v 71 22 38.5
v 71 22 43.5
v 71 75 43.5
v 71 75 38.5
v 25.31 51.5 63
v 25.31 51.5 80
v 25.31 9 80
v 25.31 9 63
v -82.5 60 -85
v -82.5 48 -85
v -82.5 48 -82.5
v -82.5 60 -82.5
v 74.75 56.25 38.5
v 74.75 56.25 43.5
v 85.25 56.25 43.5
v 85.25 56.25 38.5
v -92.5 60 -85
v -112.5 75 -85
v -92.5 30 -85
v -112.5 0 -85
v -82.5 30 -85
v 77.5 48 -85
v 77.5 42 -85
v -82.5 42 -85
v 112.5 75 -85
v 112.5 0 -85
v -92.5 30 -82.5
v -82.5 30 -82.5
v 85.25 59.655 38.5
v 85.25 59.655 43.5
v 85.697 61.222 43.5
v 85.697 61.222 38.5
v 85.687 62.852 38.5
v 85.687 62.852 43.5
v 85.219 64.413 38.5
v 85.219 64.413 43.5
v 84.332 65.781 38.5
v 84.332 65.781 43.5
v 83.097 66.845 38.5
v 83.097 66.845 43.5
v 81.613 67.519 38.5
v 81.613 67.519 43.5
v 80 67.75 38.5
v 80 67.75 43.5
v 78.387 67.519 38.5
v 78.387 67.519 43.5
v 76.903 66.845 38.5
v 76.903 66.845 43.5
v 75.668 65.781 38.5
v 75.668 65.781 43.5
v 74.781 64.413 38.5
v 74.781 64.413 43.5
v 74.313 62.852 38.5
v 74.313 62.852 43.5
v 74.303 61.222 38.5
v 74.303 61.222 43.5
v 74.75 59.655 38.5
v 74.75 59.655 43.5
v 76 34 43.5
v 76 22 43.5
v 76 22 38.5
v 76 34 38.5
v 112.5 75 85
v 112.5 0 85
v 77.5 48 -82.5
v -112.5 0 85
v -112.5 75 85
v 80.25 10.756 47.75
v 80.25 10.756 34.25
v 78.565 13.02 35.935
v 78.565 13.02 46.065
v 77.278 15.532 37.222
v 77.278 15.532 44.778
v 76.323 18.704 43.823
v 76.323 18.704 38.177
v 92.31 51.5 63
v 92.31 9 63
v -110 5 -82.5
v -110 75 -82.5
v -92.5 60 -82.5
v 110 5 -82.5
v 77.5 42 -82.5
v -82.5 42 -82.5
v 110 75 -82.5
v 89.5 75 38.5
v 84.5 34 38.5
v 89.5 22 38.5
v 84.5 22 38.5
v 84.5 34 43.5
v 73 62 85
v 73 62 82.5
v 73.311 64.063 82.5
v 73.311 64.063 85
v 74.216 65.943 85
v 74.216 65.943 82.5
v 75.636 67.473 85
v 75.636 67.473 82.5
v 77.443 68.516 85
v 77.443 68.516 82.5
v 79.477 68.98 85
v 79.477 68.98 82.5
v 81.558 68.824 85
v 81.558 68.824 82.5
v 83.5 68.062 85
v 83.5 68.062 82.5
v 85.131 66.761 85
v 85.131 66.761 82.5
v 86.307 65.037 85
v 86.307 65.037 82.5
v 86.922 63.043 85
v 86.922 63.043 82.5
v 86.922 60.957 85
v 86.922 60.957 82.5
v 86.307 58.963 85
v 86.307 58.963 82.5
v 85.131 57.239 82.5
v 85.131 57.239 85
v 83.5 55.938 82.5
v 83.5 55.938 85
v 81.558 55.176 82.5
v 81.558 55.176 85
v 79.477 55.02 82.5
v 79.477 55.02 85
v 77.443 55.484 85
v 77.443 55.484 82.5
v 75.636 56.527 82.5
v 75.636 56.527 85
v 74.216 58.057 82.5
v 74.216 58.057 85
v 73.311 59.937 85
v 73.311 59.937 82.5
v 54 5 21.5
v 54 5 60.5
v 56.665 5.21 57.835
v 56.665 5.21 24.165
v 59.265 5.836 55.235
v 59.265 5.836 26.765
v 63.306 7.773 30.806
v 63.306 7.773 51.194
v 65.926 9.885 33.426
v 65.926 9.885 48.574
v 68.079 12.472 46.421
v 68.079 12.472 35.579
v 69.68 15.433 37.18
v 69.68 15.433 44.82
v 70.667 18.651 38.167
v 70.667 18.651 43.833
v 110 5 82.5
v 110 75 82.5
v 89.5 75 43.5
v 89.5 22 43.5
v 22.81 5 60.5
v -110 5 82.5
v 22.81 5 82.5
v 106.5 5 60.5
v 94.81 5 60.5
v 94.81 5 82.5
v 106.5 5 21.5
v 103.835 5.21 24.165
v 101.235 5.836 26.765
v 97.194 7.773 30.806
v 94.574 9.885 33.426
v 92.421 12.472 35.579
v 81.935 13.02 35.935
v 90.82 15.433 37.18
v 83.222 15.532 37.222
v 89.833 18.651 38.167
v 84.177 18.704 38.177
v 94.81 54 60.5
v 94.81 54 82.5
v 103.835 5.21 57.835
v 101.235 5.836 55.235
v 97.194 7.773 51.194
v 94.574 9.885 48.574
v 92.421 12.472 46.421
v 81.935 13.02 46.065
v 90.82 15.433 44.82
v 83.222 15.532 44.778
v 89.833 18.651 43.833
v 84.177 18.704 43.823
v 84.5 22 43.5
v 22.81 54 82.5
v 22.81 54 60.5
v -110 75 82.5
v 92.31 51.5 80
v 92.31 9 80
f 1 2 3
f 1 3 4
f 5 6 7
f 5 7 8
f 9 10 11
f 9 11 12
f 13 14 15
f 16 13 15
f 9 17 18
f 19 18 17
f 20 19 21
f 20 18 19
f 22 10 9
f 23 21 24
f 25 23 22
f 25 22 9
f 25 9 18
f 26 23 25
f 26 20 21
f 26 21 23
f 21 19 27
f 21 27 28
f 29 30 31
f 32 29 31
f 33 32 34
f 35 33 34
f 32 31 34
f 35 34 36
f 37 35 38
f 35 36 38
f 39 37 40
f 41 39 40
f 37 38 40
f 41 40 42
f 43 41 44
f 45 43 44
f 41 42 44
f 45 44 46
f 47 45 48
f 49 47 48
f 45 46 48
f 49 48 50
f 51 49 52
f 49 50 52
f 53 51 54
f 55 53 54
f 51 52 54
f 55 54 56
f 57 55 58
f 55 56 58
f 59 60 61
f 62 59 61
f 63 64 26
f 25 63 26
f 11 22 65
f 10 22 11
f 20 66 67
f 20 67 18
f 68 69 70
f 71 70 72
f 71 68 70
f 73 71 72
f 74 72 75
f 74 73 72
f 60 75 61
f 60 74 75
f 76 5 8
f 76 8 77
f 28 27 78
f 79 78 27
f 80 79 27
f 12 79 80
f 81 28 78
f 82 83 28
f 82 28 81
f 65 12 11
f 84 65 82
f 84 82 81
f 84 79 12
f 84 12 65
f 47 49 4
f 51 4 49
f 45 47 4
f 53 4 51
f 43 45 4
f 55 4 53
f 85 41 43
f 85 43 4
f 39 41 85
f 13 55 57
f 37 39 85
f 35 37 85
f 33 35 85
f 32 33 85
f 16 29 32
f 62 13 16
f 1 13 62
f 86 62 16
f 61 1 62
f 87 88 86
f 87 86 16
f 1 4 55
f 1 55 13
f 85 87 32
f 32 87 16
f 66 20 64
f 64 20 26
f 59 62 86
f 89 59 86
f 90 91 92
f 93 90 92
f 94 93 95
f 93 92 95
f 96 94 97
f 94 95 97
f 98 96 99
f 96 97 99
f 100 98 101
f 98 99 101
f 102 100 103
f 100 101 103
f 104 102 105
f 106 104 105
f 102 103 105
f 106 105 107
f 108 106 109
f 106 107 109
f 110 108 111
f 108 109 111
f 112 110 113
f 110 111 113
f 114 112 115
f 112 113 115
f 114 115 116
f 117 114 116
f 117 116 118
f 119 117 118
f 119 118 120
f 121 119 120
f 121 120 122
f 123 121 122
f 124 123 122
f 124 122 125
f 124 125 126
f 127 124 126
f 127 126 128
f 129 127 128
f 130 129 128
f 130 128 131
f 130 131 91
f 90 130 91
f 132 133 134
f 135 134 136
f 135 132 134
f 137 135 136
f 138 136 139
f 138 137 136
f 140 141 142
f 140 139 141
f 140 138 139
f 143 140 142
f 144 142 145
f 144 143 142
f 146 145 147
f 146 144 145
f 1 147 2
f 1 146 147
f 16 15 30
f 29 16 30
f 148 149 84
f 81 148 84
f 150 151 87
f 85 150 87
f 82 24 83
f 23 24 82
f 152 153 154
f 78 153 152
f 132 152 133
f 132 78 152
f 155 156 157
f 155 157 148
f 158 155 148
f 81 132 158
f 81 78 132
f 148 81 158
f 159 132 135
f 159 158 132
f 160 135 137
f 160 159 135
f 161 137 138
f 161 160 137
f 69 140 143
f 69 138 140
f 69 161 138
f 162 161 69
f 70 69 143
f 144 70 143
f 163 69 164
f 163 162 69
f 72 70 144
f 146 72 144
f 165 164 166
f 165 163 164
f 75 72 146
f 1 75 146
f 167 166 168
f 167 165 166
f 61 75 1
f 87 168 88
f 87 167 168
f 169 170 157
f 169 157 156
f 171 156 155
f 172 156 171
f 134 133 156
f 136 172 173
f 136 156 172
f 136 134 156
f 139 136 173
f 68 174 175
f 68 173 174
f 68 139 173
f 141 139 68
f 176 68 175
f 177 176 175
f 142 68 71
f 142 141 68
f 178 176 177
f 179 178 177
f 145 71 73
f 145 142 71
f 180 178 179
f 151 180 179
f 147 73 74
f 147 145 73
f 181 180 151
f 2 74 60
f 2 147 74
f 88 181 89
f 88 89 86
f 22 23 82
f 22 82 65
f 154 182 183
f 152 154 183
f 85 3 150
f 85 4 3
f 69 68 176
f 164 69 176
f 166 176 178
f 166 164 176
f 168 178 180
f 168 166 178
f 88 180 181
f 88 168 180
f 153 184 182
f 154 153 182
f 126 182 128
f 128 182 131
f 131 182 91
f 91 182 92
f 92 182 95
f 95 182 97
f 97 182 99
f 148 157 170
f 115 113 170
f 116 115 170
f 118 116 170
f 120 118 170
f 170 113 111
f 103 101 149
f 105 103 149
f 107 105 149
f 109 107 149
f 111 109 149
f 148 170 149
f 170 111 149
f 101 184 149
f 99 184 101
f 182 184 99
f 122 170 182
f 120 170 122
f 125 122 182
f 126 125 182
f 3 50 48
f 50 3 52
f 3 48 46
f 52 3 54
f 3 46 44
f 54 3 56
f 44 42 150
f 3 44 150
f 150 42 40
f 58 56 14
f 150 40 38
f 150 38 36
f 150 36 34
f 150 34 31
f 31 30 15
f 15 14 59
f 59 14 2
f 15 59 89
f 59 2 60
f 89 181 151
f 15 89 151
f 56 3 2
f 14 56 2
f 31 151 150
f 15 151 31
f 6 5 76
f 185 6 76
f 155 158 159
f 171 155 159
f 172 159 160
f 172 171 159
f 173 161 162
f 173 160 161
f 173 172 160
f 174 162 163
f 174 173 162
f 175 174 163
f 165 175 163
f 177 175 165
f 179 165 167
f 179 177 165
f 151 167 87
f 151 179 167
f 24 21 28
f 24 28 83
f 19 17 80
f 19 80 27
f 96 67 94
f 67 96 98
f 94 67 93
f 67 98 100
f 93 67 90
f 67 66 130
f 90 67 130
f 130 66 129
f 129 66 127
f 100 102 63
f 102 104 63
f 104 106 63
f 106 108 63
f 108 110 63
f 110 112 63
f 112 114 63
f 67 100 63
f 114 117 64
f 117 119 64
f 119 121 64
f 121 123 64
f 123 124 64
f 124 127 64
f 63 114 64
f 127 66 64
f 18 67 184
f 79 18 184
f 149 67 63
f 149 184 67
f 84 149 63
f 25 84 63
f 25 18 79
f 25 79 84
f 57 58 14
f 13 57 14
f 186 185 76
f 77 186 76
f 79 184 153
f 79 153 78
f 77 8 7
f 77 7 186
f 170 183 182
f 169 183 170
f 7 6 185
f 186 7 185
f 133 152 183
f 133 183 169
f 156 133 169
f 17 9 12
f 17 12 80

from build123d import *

# Parameters (mm, degrees)
SKETCH1_W                = 225
SKETCH1_H                = 170
BOSS_EXTRUDE1_DEPTH      = 75
SKETCH2_W                = 220
SKETCH2_H                = 165
CUT_EXTRUDE1_DEPTH       = 70
CUT_EXTRUDE2_DEPTH       = 10
SKETCH6_W                = 72
SKETCH6_H                = 22
BOSS_EXTRUDE2_DEPTH      = 49
SKETCH8_R                = 7
CUT_EXTRUDE3_DEPTH       = 25
SKETCH6_4_W              = 5
SKETCH6_4_H              = 5
BOSS_EXTRUDE4_DEPTH      = 70
BOSS_EXTRUDE5_DEPTH      = 40
BOSS_EXTRUDE5_DEPTH_BACK = 1
BOSS_EXTRUDE5_START      = 30
SKETCH11_W               = 8.5
SKETCH11_H               = 5
CUT_EXTRUDE4_DEPTH       = 10
CUT_EXTRUDE5_START       = -2.5
SKETCH13_W               = 67
SKETCH13_H               = 17
CUT_EXTRUDE5_DEPTH       = 42.5
FILLET1_R                = 17


with BuildPart() as part:
    # Sketch1 → Boss-Extrude1 (new body)
    with BuildSketch(Plane(origin=(0, 0, 0), x_dir=(1, 0, 0), z_dir=(0, 1, 0))):
        Rectangle(SKETCH1_W, SKETCH1_H)
    extrude(amount=BOSS_EXTRUDE1_DEPTH)

    # Sketch2 → Cut-Extrude1 (cut)
    with BuildSketch(Plane(origin=(0, 75, 0), x_dir=(1, 0, 0), z_dir=(0, 1, 0))):
        Rectangle(SKETCH2_W, SKETCH2_H)
    extrude(amount=-CUT_EXTRUDE1_DEPTH, mode=Mode.SUBTRACT)

    # Sketch5 → Cut-Extrude2 (cut)
    with BuildSketch(Plane(origin=(0, 0, -85), x_dir=(-1, 0, 0), z_dir=(0, 0, -1))):
        Polygon((92.5, 60), (92.5, 30), (82.5, 30), (82.5, 42), (-77.5, 42), (-77.5, 48), (82.5, 48), (82.5, 60), align=None)
    extrude(amount=-CUT_EXTRUDE2_DEPTH, mode=Mode.SUBTRACT)

    # Sketch6 → Boss-Extrude2 (add)
    with BuildSketch(Plane(origin=(0, 5, 0), x_dir=(1, 0, 0), z_dir=(0, 1, 0))):
        with Locations((58.810452566, -71.5)):
            Rectangle(SKETCH6_W, SKETCH6_H)
    extrude(amount=BOSS_EXTRUDE2_DEPTH)

    # Sketch8 → Cut-Extrude3 (cut)
    with BuildSketch(Plane(origin=(0, 0, 82.5), x_dir=(-1, 0, 0), z_dir=(0, 0, -1))):
        with Locations((-80, 62)):
            Circle(SKETCH8_R)
    extrude(amount=-CUT_EXTRUDE3_DEPTH, mode=Mode.SUBTRACT)

    # Sketch6<4> → Boss-Extrude4 (add)
    with BuildSketch(Plane(origin=(0, 5, 0), x_dir=(1, 0, 0), z_dir=(0, 1, 0))):
        with Locations((73.5, -41)):
            Rectangle(SKETCH6_4_W, SKETCH6_4_H)
        with Locations((87, -41)):
            Rectangle(SKETCH6_4_W, SKETCH6_4_H)
    extrude(amount=BOSS_EXTRUDE4_DEPTH)

    # Sketch11 → Boss-Extrude5 (add, two sides: drawn at the far end of the back side and taken through both)
    with BuildSketch(Plane(origin=(0, 5, 0), x_dir=(1, 0, 0), z_dir=(0, 1, 0)).offset(BOSS_EXTRUDE5_START - BOSS_EXTRUDE5_DEPTH_BACK)):
        with Locations((80.25, -41)):
            Rectangle(SKETCH11_W, SKETCH11_H)
    extrude(amount=BOSS_EXTRUDE5_DEPTH + BOSS_EXTRUDE5_DEPTH_BACK)

    # Sketch12 → Cut-Extrude4 (cut)
    with BuildSketch(Plane.XY.offset(43.5)):
        with BuildLine():
            Line((74.75, 59.65479212), (74.75, 56.25))
            Line((74.75, 56.25), (85.25, 56.25))
            Line((85.25, 56.25), (85.25, 59.65479212))
            ThreePointArc((85.25, 59.65479212), (80, 67.75), (74.75, 59.65479212))
        make_face()
    extrude(amount=-CUT_EXTRUDE4_DEPTH, mode=Mode.SUBTRACT)

    # Sketch13 → Cut-Extrude5 (cut)
    with BuildSketch(Plane(origin=(0, 54, 0), x_dir=(1, 0, 0), z_dir=(0, 1, 0)).offset(CUT_EXTRUDE5_START)):
        with Locations((58.810452566, -71.5)):
            Rectangle(SKETCH13_W, SKETCH13_H)
    extrude(amount=-CUT_EXTRUDE5_DEPTH, mode=Mode.SUBTRACT)

    # Fillet1
    # the kernel refuses this fillet: 17 mm, written as the material it adds along each edge
    with BuildSketch(Plane(origin=(84.5, 5, 38.5), x_dir=(-1, 0, 0), z_dir=(0, 0, 1)), Plane(origin=(89.5, 5, 38.5), x_dir=(0, 0, -1), z_dir=(-1, 0, 0)), Plane(origin=(71, 5, 43.5), x_dir=(0, 0, 1), z_dir=(1, 0, 0)), Plane(origin=(76, 5, 43.5), x_dir=(1, 0, 0), z_dir=(0, 0, -1)), Plane(origin=(71, 5, 38.5), x_dir=(-1, 0, 0), z_dir=(0, 0, 1)), Plane(origin=(76, 5, 38.5), x_dir=(0, 0, -1), z_dir=(-1, 0, 0)), Plane(origin=(84.5, 5, 43.5), x_dir=(0, 0, 1), z_dir=(1, 0, 0)), Plane(origin=(89.5, 5, 43.5), x_dir=(1, 0, 0), z_dir=(0, 0, -1))) as fillet1_piece_1:
        with BuildLine():
            CenterArc((FILLET1_R, -FILLET1_R), FILLET1_R, 90, 90)
            Line((0, -FILLET1_R), (-FILLET1_R * 0.02, -FILLET1_R))
            Line((-FILLET1_R * 0.02, -FILLET1_R), (-FILLET1_R * 0.02, FILLET1_R * 0.02))
            Line((-FILLET1_R * 0.02, FILLET1_R * 0.02), (FILLET1_R, FILLET1_R * 0.02))
            Line((FILLET1_R, FILLET1_R * 0.02), (FILLET1_R, 0))
        make_face()
    extrude(amount=5)
    with BuildSketch(Plane(origin=(84.5, 5, -4), x_dir=(-1, 0, 0), z_dir=(0, 0, 1))) as fillet1_piece_2a_section:
        with BuildLine():
            CenterArc((FILLET1_R, -FILLET1_R), FILLET1_R, 90, 90)
            Line((0, -FILLET1_R), (-FILLET1_R * 0.02, -FILLET1_R))
            Line((-FILLET1_R * 0.02, -FILLET1_R), (-FILLET1_R * 0.02, FILLET1_R * 0.02))
            Line((-FILLET1_R * 0.02, FILLET1_R * 0.02), (FILLET1_R, FILLET1_R * 0.02))
            Line((FILLET1_R, FILLET1_R * 0.02), (FILLET1_R, 0))
        make_face()
    fillet1_piece_2a = extrude(amount=47.5, mode=Mode.PRIVATE)
    fillet1_piece_2a = split(fillet1_piece_2a, bisect_by=Plane(origin=(80.651283057, 8.848716943, 38.5), z_dir=(0, 0, -1)), keep=Keep.TOP, mode=Mode.PRIVATE)
    with BuildSketch(Plane(origin=(89.5, 5, 38.5), x_dir=(0, 0, -1), z_dir=(-1, 0, 0))) as fillet1_piece_2b_section:
        with BuildLine():
            CenterArc((FILLET1_R, -FILLET1_R), FILLET1_R, 90, 90)
            Line((0, -FILLET1_R), (-FILLET1_R * 0.02, -FILLET1_R))
            Line((-FILLET1_R * 0.02, -FILLET1_R), (-FILLET1_R * 0.02, FILLET1_R * 0.02))
            Line((-FILLET1_R * 0.02, FILLET1_R * 0.02), (FILLET1_R, FILLET1_R * 0.02))
            Line((FILLET1_R, FILLET1_R * 0.02), (FILLET1_R, 0))
        make_face()
    fillet1_piece_2b = extrude(amount=47.5, mode=Mode.PRIVATE)
    fillet1_piece_2b = split(fillet1_piece_2b, bisect_by=Plane(origin=(84.5, 8.848716943, 34.651283057), z_dir=(-1, 0, 0)), keep=Keep.TOP, mode=Mode.PRIVATE)
    fillet1_piece_2 = fillet1_piece_2a & fillet1_piece_2b
    add(fillet1_piece_2)
    with BuildSketch(Plane(origin=(84.5, 5, 38.5), x_dir=(-1, 0, 0), z_dir=(0, 0, 1))) as fillet1_piece_3a_section:
        with BuildLine():
            CenterArc((FILLET1_R, -FILLET1_R), FILLET1_R, 90, 90)
            Line((0, -FILLET1_R), (-FILLET1_R * 0.02, -FILLET1_R))
            Line((-FILLET1_R * 0.02, -FILLET1_R), (-FILLET1_R * 0.02, FILLET1_R * 0.02))
            Line((-FILLET1_R * 0.02, FILLET1_R * 0.02), (FILLET1_R, FILLET1_R * 0.02))
            Line((FILLET1_R, FILLET1_R * 0.02), (FILLET1_R, 0))
        make_face()
    fillet1_piece_3a = extrude(amount=47.5, mode=Mode.PRIVATE)
    fillet1_piece_3a = split(fillet1_piece_3a, bisect_by=Plane(origin=(80.651283057, 8.848716943, 43.5), z_dir=(0, 0, 1)), keep=Keep.TOP, mode=Mode.PRIVATE)
    with BuildSketch(Plane(origin=(42, 5, 43.5), x_dir=(0, 0, 1), z_dir=(1, 0, 0))) as fillet1_piece_3b_section:
        with BuildLine():
            CenterArc((FILLET1_R, -FILLET1_R), FILLET1_R, 90, 90)
            Line((0, -FILLET1_R), (-FILLET1_R * 0.02, -FILLET1_R))
            Line((-FILLET1_R * 0.02, -FILLET1_R), (-FILLET1_R * 0.02, FILLET1_R * 0.02))
            Line((-FILLET1_R * 0.02, FILLET1_R * 0.02), (FILLET1_R, FILLET1_R * 0.02))
            Line((FILLET1_R, FILLET1_R * 0.02), (FILLET1_R, 0))
        make_face()
    fillet1_piece_3b = extrude(amount=47.5, mode=Mode.PRIVATE)
    fillet1_piece_3b = split(fillet1_piece_3b, bisect_by=Plane(origin=(84.5, 8.848716943, 47.348716943), z_dir=(-1, 0, 0)), keep=Keep.TOP, mode=Mode.PRIVATE)
    fillet1_piece_3 = fillet1_piece_3a & fillet1_piece_3b
    add(fillet1_piece_3)
    with BuildSketch(Plane(origin=(132, 5, 38.5), x_dir=(0, 0, -1), z_dir=(-1, 0, 0))) as fillet1_piece_4a_section:
        with BuildLine():
            CenterArc((FILLET1_R, -FILLET1_R), FILLET1_R, 90, 90)
            Line((0, -FILLET1_R), (-FILLET1_R * 0.02, -FILLET1_R))
            Line((-FILLET1_R * 0.02, -FILLET1_R), (-FILLET1_R * 0.02, FILLET1_R * 0.02))
            Line((-FILLET1_R * 0.02, FILLET1_R * 0.02), (FILLET1_R, FILLET1_R * 0.02))
            Line((FILLET1_R, FILLET1_R * 0.02), (FILLET1_R, 0))
        make_face()
    fillet1_piece_4a = extrude(amount=47.5, mode=Mode.PRIVATE)
    fillet1_piece_4a = split(fillet1_piece_4a, bisect_by=Plane(origin=(89.5, 8.848716943, 34.651283057), z_dir=(1, 0, 0)), keep=Keep.TOP, mode=Mode.PRIVATE)
    with BuildSketch(Plane(origin=(89.5, 5, 43.5), x_dir=(1, 0, 0), z_dir=(0, 0, -1))) as fillet1_piece_4b_section:
        with BuildLine():
            CenterArc((FILLET1_R, -FILLET1_R), FILLET1_R, 90, 90)
            Line((0, -FILLET1_R), (-FILLET1_R * 0.02, -FILLET1_R))
            Line((-FILLET1_R * 0.02, -FILLET1_R), (-FILLET1_R * 0.02, FILLET1_R * 0.02))
            Line((-FILLET1_R * 0.02, FILLET1_R * 0.02), (FILLET1_R, FILLET1_R * 0.02))
            Line((FILLET1_R, FILLET1_R * 0.02), (FILLET1_R, 0))
        make_face()
    fillet1_piece_4b = extrude(amount=47.5, mode=Mode.PRIVATE)
    fillet1_piece_4b = split(fillet1_piece_4b, bisect_by=Plane(origin=(93.348716943, 8.848716943, 38.5), z_dir=(0, 0, -1)), keep=Keep.TOP, mode=Mode.PRIVATE)
    fillet1_piece_4 = fillet1_piece_4a & fillet1_piece_4b
    add(fillet1_piece_4)
    with BuildSketch(Plane(origin=(71, 5, 38.5), x_dir=(-1, 0, 0), z_dir=(0, 0, 1))) as fillet1_piece_5a_section:
        with BuildLine():
            CenterArc((FILLET1_R, -FILLET1_R), FILLET1_R, 90, 90)
            Line((0, -FILLET1_R), (-FILLET1_R * 0.02, -FILLET1_R))
            Line((-FILLET1_R * 0.02, -FILLET1_R), (-FILLET1_R * 0.02, FILLET1_R * 0.02))
            Line((-FILLET1_R * 0.02, FILLET1_R * 0.02), (FILLET1_R, FILLET1_R * 0.02))
            Line((FILLET1_R, FILLET1_R * 0.02), (FILLET1_R, 0))
        make_face()
    fillet1_piece_5a = extrude(amount=47.5, mode=Mode.PRIVATE)
    fillet1_piece_5a = split(fillet1_piece_5a, bisect_by=Plane(origin=(67.151283057, 8.848716943, 43.5), z_dir=(0, 0, 1)), keep=Keep.TOP, mode=Mode.PRIVATE)
    with BuildSketch(Plane(origin=(28.5, 5, 43.5), x_dir=(0, 0, 1), z_dir=(1, 0, 0))) as fillet1_piece_5b_section:
        with BuildLine():
            CenterArc((FILLET1_R, -FILLET1_R), FILLET1_R, 90, 90)
            Line((0, -FILLET1_R), (-FILLET1_R * 0.02, -FILLET1_R))
            Line((-FILLET1_R * 0.02, -FILLET1_R), (-FILLET1_R * 0.02, FILLET1_R * 0.02))
            Line((-FILLET1_R * 0.02, FILLET1_R * 0.02), (FILLET1_R, FILLET1_R * 0.02))
            Line((FILLET1_R, FILLET1_R * 0.02), (FILLET1_R, 0))
        make_face()
    fillet1_piece_5b = extrude(amount=47.5, mode=Mode.PRIVATE)
    fillet1_piece_5b = split(fillet1_piece_5b, bisect_by=Plane(origin=(71, 8.848716943, 47.348716943), z_dir=(-1, 0, 0)), keep=Keep.TOP, mode=Mode.PRIVATE)
    fillet1_piece_5 = fillet1_piece_5a & fillet1_piece_5b
    add(fillet1_piece_5)
    with BuildSketch(Plane(origin=(76, 5, 86), x_dir=(1, 0, 0), z_dir=(0, 0, -1))) as fillet1_piece_6a_section:
        with BuildLine():
            CenterArc((FILLET1_R, -FILLET1_R), FILLET1_R, 90, 90)
            Line((0, -FILLET1_R), (-FILLET1_R * 0.02, -FILLET1_R))
            Line((-FILLET1_R * 0.02, -FILLET1_R), (-FILLET1_R * 0.02, FILLET1_R * 0.02))
            Line((-FILLET1_R * 0.02, FILLET1_R * 0.02), (FILLET1_R, FILLET1_R * 0.02))
            Line((FILLET1_R, FILLET1_R * 0.02), (FILLET1_R, 0))
        make_face()
    fillet1_piece_6a = extrude(amount=47.5, mode=Mode.PRIVATE)
    fillet1_piece_6a = split(fillet1_piece_6a, bisect_by=Plane(origin=(79.848716943, 8.848716943, 43.5), z_dir=(0, 0, 1)), keep=Keep.TOP, mode=Mode.PRIVATE)
    with BuildSketch(Plane(origin=(71, 5, 43.5), x_dir=(0, 0, 1), z_dir=(1, 0, 0))) as fillet1_piece_6b_section:
        with BuildLine():
            CenterArc((FILLET1_R, -FILLET1_R), FILLET1_R, 90, 90)
            Line((0, -FILLET1_R), (-FILLET1_R * 0.02, -FILLET1_R))
            Line((-FILLET1_R * 0.02, -FILLET1_R), (-FILLET1_R * 0.02, FILLET1_R * 0.02))
            Line((-FILLET1_R * 0.02, FILLET1_R * 0.02), (FILLET1_R, FILLET1_R * 0.02))
            Line((FILLET1_R, FILLET1_R * 0.02), (FILLET1_R, 0))
        make_face()
    fillet1_piece_6b = extrude(amount=47.5, mode=Mode.PRIVATE)
    fillet1_piece_6b = split(fillet1_piece_6b, bisect_by=Plane(origin=(76, 8.848716943, 47.348716943), z_dir=(1, 0, 0)), keep=Keep.TOP, mode=Mode.PRIVATE)
    fillet1_piece_6 = fillet1_piece_6a & fillet1_piece_6b
    add(fillet1_piece_6)
    with BuildSketch(Plane(origin=(118.5, 5, 38.5), x_dir=(0, 0, -1), z_dir=(-1, 0, 0))) as fillet1_piece_7a_section:
        with BuildLine():
            CenterArc((FILLET1_R, -FILLET1_R), FILLET1_R, 90, 90)
            Line((0, -FILLET1_R), (-FILLET1_R * 0.02, -FILLET1_R))
            Line((-FILLET1_R * 0.02, -FILLET1_R), (-FILLET1_R * 0.02, FILLET1_R * 0.02))
            Line((-FILLET1_R * 0.02, FILLET1_R * 0.02), (FILLET1_R, FILLET1_R * 0.02))
            Line((FILLET1_R, FILLET1_R * 0.02), (FILLET1_R, 0))
        make_face()
    fillet1_piece_7a = extrude(amount=47.5, mode=Mode.PRIVATE)
    fillet1_piece_7a = split(fillet1_piece_7a, bisect_by=Plane(origin=(76, 8.848716943, 34.651283057), z_dir=(1, 0, 0)), keep=Keep.TOP, mode=Mode.PRIVATE)
    with BuildSketch(Plane(origin=(76, 5, 43.5), x_dir=(1, 0, 0), z_dir=(0, 0, -1))) as fillet1_piece_7b_section:
        with BuildLine():
            CenterArc((FILLET1_R, -FILLET1_R), FILLET1_R, 90, 90)
            Line((0, -FILLET1_R), (-FILLET1_R * 0.02, -FILLET1_R))
            Line((-FILLET1_R * 0.02, -FILLET1_R), (-FILLET1_R * 0.02, FILLET1_R * 0.02))
            Line((-FILLET1_R * 0.02, FILLET1_R * 0.02), (FILLET1_R, FILLET1_R * 0.02))
            Line((FILLET1_R, FILLET1_R * 0.02), (FILLET1_R, 0))
        make_face()
    fillet1_piece_7b = extrude(amount=47.5, mode=Mode.PRIVATE)
    fillet1_piece_7b = split(fillet1_piece_7b, bisect_by=Plane(origin=(79.848716943, 8.848716943, 38.5), z_dir=(0, 0, -1)), keep=Keep.TOP, mode=Mode.PRIVATE)
    fillet1_piece_7 = fillet1_piece_7a & fillet1_piece_7b
    add(fillet1_piece_7)
    with BuildSketch(Plane(origin=(71, 5, -4), x_dir=(-1, 0, 0), z_dir=(0, 0, 1))) as fillet1_piece_8a_section:
        with BuildLine():
            CenterArc((FILLET1_R, -FILLET1_R), FILLET1_R, 90, 90)
            Line((0, -FILLET1_R), (-FILLET1_R * 0.02, -FILLET1_R))
            Line((-FILLET1_R * 0.02, -FILLET1_R), (-FILLET1_R * 0.02, FILLET1_R * 0.02))
            Line((-FILLET1_R * 0.02, FILLET1_R * 0.02), (FILLET1_R, FILLET1_R * 0.02))
            Line((FILLET1_R, FILLET1_R * 0.02), (FILLET1_R, 0))
        make_face()
    fillet1_piece_8a = extrude(amount=47.5, mode=Mode.PRIVATE)
    fillet1_piece_8a = split(fillet1_piece_8a, bisect_by=Plane(origin=(67.151283057, 8.848716943, 38.5), z_dir=(0, 0, -1)), keep=Keep.TOP, mode=Mode.PRIVATE)
    with BuildSketch(Plane(origin=(76, 5, 38.5), x_dir=(0, 0, -1), z_dir=(-1, 0, 0))) as fillet1_piece_8b_section:
        with BuildLine():
            CenterArc((FILLET1_R, -FILLET1_R), FILLET1_R, 90, 90)
            Line((0, -FILLET1_R), (-FILLET1_R * 0.02, -FILLET1_R))
            Line((-FILLET1_R * 0.02, -FILLET1_R), (-FILLET1_R * 0.02, FILLET1_R * 0.02))
            Line((-FILLET1_R * 0.02, FILLET1_R * 0.02), (FILLET1_R, FILLET1_R * 0.02))
            Line((FILLET1_R, FILLET1_R * 0.02), (FILLET1_R, 0))
        make_face()
    fillet1_piece_8b = extrude(amount=47.5, mode=Mode.PRIVATE)
    fillet1_piece_8b = split(fillet1_piece_8b, bisect_by=Plane(origin=(71, 8.848716943, 34.651283057), z_dir=(-1, 0, 0)), keep=Keep.TOP, mode=Mode.PRIVATE)
    fillet1_piece_8 = fillet1_piece_8a & fillet1_piece_8b
    add(fillet1_piece_8)
    with BuildSketch(Plane(origin=(89.5, 5, 86), x_dir=(1, 0, 0), z_dir=(0, 0, -1))) as fillet1_piece_9a_section:
        with BuildLine():
            CenterArc((FILLET1_R, -FILLET1_R), FILLET1_R, 90, 90)
            Line((0, -FILLET1_R), (-FILLET1_R * 0.02, -FILLET1_R))
            Line((-FILLET1_R * 0.02, -FILLET1_R), (-FILLET1_R * 0.02, FILLET1_R * 0.02))
            Line((-FILLET1_R * 0.02, FILLET1_R * 0.02), (FILLET1_R, FILLET1_R * 0.02))
            Line((FILLET1_R, FILLET1_R * 0.02), (FILLET1_R, 0))
        make_face()
    fillet1_piece_9a = extrude(amount=47.5, mode=Mode.PRIVATE)
    fillet1_piece_9a = split(fillet1_piece_9a, bisect_by=Plane(origin=(93.348716943, 8.848716943, 43.5), z_dir=(0, 0, 1)), keep=Keep.TOP, mode=Mode.PRIVATE)
    with BuildSketch(Plane(origin=(84.5, 5, 43.5), x_dir=(0, 0, 1), z_dir=(1, 0, 0))) as fillet1_piece_9b_section:
        with BuildLine():
            CenterArc((FILLET1_R, -FILLET1_R), FILLET1_R, 90, 90)
            Line((0, -FILLET1_R), (-FILLET1_R * 0.02, -FILLET1_R))
            Line((-FILLET1_R * 0.02, -FILLET1_R), (-FILLET1_R * 0.02, FILLET1_R * 0.02))
            Line((-FILLET1_R * 0.02, FILLET1_R * 0.02), (FILLET1_R, FILLET1_R * 0.02))
            Line((FILLET1_R, FILLET1_R * 0.02), (FILLET1_R, 0))
        make_face()
    fillet1_piece_9b = extrude(amount=47.5, mode=Mode.PRIVATE)
    fillet1_piece_9b = split(fillet1_piece_9b, bisect_by=Plane(origin=(89.5, 8.848716943, 47.348716943), z_dir=(1, 0, 0)), keep=Keep.TOP, mode=Mode.PRIVATE)
    fillet1_piece_9 = fillet1_piece_9a & fillet1_piece_9b
    add(fillet1_piece_9)


solid = part.part
